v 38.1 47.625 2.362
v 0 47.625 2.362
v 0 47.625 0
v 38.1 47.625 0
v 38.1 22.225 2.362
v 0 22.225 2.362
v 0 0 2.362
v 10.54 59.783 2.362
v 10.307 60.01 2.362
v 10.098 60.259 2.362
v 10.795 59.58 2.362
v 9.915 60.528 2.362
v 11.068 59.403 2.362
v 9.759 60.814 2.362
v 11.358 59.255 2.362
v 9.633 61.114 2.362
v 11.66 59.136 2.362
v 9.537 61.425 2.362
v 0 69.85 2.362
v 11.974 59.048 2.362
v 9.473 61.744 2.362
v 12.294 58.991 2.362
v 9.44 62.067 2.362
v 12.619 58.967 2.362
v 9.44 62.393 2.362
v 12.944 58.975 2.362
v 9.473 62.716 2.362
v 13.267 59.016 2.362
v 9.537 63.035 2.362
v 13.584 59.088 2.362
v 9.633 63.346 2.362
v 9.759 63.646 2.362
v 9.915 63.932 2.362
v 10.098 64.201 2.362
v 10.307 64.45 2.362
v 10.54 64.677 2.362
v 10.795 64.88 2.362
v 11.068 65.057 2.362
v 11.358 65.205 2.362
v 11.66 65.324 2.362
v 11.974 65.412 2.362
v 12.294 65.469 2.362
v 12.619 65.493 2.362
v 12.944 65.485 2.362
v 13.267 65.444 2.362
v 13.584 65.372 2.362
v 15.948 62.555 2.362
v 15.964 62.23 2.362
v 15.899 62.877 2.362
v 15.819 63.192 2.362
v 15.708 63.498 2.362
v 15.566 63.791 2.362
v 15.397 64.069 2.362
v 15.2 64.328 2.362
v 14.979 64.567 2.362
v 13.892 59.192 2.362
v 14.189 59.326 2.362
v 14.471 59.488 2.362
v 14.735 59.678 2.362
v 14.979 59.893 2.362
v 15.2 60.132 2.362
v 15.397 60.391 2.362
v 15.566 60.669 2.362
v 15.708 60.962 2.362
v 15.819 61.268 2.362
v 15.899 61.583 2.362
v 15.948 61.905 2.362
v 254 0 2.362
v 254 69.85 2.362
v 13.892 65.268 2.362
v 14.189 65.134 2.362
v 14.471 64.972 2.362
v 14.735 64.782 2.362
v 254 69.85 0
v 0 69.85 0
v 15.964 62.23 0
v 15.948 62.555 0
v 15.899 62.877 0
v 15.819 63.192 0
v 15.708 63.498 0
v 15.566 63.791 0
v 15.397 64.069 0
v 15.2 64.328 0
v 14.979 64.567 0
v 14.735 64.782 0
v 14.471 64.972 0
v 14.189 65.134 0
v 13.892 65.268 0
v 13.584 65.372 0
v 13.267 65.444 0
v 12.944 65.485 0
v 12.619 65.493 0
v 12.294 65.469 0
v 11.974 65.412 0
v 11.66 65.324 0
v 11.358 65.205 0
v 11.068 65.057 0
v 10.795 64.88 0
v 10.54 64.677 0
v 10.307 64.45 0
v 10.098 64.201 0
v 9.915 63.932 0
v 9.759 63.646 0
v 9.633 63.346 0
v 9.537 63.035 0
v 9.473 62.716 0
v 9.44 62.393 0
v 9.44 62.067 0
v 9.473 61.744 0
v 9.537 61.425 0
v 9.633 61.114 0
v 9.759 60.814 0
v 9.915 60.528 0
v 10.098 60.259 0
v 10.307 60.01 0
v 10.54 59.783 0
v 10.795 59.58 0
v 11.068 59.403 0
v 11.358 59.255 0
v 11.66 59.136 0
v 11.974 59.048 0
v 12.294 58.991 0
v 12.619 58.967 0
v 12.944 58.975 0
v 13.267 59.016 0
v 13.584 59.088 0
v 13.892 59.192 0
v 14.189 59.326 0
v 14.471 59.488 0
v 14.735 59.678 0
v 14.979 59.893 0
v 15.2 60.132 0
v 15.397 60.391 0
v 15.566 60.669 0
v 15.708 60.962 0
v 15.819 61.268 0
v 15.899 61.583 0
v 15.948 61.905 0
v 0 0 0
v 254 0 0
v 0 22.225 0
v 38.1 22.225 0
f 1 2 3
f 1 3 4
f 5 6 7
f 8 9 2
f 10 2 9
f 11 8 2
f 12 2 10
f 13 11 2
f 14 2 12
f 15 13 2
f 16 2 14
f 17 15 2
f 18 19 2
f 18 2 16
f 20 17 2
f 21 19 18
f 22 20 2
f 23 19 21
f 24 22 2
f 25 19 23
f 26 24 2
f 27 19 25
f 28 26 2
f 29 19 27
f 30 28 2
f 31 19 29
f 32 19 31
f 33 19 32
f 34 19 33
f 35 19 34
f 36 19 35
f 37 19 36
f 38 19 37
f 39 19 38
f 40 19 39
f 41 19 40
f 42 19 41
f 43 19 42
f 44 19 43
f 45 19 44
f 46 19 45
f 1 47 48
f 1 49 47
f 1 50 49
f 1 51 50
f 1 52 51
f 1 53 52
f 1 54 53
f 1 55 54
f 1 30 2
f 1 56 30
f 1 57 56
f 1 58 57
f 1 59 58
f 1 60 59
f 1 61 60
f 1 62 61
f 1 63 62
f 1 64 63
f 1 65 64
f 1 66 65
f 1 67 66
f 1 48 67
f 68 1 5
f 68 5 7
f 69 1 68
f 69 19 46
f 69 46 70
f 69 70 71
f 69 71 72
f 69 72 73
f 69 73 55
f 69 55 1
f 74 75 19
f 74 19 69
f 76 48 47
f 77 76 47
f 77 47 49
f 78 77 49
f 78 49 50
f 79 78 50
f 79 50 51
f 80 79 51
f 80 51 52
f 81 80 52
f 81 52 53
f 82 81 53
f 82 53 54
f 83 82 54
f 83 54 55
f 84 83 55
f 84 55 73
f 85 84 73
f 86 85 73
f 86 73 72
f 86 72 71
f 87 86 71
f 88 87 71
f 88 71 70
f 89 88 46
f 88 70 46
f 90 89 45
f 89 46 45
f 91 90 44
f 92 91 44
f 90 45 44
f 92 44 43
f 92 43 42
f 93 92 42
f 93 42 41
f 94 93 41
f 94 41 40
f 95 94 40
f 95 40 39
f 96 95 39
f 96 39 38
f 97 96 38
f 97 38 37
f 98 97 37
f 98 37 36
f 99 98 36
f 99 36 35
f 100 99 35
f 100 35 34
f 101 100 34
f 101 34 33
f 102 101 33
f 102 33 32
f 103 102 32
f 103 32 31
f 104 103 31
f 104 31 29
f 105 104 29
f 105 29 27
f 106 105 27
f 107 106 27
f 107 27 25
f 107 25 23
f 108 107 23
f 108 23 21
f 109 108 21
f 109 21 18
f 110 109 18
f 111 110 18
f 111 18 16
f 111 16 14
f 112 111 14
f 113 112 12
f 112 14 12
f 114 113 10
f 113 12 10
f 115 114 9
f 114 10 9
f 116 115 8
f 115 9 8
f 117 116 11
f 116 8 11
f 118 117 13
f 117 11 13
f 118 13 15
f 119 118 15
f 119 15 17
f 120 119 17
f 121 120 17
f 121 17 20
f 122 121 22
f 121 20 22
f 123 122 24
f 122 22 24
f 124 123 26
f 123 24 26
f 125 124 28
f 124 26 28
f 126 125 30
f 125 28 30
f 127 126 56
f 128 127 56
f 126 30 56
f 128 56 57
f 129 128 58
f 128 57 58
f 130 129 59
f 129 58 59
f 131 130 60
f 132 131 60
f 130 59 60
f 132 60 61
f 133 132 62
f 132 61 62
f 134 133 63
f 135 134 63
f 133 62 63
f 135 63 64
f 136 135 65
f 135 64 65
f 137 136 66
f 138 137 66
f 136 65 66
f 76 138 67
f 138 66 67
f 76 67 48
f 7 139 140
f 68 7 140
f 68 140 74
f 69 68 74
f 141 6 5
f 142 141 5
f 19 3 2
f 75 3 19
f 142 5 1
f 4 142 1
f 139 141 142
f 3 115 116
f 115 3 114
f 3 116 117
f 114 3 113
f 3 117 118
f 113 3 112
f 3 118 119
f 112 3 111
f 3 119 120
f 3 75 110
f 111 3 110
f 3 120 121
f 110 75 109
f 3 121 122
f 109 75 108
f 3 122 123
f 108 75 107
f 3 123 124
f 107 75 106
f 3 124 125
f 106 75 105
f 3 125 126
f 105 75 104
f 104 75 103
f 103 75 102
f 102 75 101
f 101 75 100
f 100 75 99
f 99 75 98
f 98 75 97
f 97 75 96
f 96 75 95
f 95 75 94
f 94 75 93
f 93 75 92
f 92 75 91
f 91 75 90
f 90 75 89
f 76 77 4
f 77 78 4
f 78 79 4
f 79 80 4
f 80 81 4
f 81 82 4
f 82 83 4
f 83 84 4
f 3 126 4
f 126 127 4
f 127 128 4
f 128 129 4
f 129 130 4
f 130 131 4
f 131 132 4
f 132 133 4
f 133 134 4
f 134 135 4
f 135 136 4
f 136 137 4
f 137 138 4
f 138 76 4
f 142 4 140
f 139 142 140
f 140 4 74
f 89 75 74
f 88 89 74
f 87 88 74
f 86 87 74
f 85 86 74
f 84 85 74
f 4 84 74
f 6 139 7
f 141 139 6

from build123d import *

# Parameters (mm, degrees)
SKETCH1_W           = 254
SKETCH1_H           = 69.85
BOSS_EXTRUDE1_DEPTH = 2.3622
SKETCH2_W           = 38.1
SKETCH2_H           = 25.4
CUT_EXTRUDE1_DEPTH  = 264.439940952
SKETCH3_R           = 3.2639
CUT_EXTRUDE2_DEPTH  = 264.439940952


with BuildPart() as part:
    # Sketch1 → Boss-Extrude1 (new body)
    with BuildSketch(Plane.XY):
        with Locations((127, 34.925)):
            Rectangle(SKETCH1_W, SKETCH1_H)
    extrude(amount=BOSS_EXTRUDE1_DEPTH)

    # Sketch2 → Cut-Extrude1 (cut, through all)
    with BuildSketch(Plane.XY.offset(2.3622)):
        with Locations((19.05, 34.925)):
            Rectangle(SKETCH2_W, SKETCH2_H)
    extrude(amount=-CUT_EXTRUDE1_DEPTH, mode=Mode.SUBTRACT)

    # Sketch3 → Cut-Extrude2 (cut, through all)
    with BuildSketch(Plane.XY.offset(2.3622)):
        with Locations((12.7, 62.23)):
            Circle(SKETCH3_R)
    extrude(amount=-CUT_EXTRUDE2_DEPTH, mode=Mode.SUBTRACT)


solid = part.part
